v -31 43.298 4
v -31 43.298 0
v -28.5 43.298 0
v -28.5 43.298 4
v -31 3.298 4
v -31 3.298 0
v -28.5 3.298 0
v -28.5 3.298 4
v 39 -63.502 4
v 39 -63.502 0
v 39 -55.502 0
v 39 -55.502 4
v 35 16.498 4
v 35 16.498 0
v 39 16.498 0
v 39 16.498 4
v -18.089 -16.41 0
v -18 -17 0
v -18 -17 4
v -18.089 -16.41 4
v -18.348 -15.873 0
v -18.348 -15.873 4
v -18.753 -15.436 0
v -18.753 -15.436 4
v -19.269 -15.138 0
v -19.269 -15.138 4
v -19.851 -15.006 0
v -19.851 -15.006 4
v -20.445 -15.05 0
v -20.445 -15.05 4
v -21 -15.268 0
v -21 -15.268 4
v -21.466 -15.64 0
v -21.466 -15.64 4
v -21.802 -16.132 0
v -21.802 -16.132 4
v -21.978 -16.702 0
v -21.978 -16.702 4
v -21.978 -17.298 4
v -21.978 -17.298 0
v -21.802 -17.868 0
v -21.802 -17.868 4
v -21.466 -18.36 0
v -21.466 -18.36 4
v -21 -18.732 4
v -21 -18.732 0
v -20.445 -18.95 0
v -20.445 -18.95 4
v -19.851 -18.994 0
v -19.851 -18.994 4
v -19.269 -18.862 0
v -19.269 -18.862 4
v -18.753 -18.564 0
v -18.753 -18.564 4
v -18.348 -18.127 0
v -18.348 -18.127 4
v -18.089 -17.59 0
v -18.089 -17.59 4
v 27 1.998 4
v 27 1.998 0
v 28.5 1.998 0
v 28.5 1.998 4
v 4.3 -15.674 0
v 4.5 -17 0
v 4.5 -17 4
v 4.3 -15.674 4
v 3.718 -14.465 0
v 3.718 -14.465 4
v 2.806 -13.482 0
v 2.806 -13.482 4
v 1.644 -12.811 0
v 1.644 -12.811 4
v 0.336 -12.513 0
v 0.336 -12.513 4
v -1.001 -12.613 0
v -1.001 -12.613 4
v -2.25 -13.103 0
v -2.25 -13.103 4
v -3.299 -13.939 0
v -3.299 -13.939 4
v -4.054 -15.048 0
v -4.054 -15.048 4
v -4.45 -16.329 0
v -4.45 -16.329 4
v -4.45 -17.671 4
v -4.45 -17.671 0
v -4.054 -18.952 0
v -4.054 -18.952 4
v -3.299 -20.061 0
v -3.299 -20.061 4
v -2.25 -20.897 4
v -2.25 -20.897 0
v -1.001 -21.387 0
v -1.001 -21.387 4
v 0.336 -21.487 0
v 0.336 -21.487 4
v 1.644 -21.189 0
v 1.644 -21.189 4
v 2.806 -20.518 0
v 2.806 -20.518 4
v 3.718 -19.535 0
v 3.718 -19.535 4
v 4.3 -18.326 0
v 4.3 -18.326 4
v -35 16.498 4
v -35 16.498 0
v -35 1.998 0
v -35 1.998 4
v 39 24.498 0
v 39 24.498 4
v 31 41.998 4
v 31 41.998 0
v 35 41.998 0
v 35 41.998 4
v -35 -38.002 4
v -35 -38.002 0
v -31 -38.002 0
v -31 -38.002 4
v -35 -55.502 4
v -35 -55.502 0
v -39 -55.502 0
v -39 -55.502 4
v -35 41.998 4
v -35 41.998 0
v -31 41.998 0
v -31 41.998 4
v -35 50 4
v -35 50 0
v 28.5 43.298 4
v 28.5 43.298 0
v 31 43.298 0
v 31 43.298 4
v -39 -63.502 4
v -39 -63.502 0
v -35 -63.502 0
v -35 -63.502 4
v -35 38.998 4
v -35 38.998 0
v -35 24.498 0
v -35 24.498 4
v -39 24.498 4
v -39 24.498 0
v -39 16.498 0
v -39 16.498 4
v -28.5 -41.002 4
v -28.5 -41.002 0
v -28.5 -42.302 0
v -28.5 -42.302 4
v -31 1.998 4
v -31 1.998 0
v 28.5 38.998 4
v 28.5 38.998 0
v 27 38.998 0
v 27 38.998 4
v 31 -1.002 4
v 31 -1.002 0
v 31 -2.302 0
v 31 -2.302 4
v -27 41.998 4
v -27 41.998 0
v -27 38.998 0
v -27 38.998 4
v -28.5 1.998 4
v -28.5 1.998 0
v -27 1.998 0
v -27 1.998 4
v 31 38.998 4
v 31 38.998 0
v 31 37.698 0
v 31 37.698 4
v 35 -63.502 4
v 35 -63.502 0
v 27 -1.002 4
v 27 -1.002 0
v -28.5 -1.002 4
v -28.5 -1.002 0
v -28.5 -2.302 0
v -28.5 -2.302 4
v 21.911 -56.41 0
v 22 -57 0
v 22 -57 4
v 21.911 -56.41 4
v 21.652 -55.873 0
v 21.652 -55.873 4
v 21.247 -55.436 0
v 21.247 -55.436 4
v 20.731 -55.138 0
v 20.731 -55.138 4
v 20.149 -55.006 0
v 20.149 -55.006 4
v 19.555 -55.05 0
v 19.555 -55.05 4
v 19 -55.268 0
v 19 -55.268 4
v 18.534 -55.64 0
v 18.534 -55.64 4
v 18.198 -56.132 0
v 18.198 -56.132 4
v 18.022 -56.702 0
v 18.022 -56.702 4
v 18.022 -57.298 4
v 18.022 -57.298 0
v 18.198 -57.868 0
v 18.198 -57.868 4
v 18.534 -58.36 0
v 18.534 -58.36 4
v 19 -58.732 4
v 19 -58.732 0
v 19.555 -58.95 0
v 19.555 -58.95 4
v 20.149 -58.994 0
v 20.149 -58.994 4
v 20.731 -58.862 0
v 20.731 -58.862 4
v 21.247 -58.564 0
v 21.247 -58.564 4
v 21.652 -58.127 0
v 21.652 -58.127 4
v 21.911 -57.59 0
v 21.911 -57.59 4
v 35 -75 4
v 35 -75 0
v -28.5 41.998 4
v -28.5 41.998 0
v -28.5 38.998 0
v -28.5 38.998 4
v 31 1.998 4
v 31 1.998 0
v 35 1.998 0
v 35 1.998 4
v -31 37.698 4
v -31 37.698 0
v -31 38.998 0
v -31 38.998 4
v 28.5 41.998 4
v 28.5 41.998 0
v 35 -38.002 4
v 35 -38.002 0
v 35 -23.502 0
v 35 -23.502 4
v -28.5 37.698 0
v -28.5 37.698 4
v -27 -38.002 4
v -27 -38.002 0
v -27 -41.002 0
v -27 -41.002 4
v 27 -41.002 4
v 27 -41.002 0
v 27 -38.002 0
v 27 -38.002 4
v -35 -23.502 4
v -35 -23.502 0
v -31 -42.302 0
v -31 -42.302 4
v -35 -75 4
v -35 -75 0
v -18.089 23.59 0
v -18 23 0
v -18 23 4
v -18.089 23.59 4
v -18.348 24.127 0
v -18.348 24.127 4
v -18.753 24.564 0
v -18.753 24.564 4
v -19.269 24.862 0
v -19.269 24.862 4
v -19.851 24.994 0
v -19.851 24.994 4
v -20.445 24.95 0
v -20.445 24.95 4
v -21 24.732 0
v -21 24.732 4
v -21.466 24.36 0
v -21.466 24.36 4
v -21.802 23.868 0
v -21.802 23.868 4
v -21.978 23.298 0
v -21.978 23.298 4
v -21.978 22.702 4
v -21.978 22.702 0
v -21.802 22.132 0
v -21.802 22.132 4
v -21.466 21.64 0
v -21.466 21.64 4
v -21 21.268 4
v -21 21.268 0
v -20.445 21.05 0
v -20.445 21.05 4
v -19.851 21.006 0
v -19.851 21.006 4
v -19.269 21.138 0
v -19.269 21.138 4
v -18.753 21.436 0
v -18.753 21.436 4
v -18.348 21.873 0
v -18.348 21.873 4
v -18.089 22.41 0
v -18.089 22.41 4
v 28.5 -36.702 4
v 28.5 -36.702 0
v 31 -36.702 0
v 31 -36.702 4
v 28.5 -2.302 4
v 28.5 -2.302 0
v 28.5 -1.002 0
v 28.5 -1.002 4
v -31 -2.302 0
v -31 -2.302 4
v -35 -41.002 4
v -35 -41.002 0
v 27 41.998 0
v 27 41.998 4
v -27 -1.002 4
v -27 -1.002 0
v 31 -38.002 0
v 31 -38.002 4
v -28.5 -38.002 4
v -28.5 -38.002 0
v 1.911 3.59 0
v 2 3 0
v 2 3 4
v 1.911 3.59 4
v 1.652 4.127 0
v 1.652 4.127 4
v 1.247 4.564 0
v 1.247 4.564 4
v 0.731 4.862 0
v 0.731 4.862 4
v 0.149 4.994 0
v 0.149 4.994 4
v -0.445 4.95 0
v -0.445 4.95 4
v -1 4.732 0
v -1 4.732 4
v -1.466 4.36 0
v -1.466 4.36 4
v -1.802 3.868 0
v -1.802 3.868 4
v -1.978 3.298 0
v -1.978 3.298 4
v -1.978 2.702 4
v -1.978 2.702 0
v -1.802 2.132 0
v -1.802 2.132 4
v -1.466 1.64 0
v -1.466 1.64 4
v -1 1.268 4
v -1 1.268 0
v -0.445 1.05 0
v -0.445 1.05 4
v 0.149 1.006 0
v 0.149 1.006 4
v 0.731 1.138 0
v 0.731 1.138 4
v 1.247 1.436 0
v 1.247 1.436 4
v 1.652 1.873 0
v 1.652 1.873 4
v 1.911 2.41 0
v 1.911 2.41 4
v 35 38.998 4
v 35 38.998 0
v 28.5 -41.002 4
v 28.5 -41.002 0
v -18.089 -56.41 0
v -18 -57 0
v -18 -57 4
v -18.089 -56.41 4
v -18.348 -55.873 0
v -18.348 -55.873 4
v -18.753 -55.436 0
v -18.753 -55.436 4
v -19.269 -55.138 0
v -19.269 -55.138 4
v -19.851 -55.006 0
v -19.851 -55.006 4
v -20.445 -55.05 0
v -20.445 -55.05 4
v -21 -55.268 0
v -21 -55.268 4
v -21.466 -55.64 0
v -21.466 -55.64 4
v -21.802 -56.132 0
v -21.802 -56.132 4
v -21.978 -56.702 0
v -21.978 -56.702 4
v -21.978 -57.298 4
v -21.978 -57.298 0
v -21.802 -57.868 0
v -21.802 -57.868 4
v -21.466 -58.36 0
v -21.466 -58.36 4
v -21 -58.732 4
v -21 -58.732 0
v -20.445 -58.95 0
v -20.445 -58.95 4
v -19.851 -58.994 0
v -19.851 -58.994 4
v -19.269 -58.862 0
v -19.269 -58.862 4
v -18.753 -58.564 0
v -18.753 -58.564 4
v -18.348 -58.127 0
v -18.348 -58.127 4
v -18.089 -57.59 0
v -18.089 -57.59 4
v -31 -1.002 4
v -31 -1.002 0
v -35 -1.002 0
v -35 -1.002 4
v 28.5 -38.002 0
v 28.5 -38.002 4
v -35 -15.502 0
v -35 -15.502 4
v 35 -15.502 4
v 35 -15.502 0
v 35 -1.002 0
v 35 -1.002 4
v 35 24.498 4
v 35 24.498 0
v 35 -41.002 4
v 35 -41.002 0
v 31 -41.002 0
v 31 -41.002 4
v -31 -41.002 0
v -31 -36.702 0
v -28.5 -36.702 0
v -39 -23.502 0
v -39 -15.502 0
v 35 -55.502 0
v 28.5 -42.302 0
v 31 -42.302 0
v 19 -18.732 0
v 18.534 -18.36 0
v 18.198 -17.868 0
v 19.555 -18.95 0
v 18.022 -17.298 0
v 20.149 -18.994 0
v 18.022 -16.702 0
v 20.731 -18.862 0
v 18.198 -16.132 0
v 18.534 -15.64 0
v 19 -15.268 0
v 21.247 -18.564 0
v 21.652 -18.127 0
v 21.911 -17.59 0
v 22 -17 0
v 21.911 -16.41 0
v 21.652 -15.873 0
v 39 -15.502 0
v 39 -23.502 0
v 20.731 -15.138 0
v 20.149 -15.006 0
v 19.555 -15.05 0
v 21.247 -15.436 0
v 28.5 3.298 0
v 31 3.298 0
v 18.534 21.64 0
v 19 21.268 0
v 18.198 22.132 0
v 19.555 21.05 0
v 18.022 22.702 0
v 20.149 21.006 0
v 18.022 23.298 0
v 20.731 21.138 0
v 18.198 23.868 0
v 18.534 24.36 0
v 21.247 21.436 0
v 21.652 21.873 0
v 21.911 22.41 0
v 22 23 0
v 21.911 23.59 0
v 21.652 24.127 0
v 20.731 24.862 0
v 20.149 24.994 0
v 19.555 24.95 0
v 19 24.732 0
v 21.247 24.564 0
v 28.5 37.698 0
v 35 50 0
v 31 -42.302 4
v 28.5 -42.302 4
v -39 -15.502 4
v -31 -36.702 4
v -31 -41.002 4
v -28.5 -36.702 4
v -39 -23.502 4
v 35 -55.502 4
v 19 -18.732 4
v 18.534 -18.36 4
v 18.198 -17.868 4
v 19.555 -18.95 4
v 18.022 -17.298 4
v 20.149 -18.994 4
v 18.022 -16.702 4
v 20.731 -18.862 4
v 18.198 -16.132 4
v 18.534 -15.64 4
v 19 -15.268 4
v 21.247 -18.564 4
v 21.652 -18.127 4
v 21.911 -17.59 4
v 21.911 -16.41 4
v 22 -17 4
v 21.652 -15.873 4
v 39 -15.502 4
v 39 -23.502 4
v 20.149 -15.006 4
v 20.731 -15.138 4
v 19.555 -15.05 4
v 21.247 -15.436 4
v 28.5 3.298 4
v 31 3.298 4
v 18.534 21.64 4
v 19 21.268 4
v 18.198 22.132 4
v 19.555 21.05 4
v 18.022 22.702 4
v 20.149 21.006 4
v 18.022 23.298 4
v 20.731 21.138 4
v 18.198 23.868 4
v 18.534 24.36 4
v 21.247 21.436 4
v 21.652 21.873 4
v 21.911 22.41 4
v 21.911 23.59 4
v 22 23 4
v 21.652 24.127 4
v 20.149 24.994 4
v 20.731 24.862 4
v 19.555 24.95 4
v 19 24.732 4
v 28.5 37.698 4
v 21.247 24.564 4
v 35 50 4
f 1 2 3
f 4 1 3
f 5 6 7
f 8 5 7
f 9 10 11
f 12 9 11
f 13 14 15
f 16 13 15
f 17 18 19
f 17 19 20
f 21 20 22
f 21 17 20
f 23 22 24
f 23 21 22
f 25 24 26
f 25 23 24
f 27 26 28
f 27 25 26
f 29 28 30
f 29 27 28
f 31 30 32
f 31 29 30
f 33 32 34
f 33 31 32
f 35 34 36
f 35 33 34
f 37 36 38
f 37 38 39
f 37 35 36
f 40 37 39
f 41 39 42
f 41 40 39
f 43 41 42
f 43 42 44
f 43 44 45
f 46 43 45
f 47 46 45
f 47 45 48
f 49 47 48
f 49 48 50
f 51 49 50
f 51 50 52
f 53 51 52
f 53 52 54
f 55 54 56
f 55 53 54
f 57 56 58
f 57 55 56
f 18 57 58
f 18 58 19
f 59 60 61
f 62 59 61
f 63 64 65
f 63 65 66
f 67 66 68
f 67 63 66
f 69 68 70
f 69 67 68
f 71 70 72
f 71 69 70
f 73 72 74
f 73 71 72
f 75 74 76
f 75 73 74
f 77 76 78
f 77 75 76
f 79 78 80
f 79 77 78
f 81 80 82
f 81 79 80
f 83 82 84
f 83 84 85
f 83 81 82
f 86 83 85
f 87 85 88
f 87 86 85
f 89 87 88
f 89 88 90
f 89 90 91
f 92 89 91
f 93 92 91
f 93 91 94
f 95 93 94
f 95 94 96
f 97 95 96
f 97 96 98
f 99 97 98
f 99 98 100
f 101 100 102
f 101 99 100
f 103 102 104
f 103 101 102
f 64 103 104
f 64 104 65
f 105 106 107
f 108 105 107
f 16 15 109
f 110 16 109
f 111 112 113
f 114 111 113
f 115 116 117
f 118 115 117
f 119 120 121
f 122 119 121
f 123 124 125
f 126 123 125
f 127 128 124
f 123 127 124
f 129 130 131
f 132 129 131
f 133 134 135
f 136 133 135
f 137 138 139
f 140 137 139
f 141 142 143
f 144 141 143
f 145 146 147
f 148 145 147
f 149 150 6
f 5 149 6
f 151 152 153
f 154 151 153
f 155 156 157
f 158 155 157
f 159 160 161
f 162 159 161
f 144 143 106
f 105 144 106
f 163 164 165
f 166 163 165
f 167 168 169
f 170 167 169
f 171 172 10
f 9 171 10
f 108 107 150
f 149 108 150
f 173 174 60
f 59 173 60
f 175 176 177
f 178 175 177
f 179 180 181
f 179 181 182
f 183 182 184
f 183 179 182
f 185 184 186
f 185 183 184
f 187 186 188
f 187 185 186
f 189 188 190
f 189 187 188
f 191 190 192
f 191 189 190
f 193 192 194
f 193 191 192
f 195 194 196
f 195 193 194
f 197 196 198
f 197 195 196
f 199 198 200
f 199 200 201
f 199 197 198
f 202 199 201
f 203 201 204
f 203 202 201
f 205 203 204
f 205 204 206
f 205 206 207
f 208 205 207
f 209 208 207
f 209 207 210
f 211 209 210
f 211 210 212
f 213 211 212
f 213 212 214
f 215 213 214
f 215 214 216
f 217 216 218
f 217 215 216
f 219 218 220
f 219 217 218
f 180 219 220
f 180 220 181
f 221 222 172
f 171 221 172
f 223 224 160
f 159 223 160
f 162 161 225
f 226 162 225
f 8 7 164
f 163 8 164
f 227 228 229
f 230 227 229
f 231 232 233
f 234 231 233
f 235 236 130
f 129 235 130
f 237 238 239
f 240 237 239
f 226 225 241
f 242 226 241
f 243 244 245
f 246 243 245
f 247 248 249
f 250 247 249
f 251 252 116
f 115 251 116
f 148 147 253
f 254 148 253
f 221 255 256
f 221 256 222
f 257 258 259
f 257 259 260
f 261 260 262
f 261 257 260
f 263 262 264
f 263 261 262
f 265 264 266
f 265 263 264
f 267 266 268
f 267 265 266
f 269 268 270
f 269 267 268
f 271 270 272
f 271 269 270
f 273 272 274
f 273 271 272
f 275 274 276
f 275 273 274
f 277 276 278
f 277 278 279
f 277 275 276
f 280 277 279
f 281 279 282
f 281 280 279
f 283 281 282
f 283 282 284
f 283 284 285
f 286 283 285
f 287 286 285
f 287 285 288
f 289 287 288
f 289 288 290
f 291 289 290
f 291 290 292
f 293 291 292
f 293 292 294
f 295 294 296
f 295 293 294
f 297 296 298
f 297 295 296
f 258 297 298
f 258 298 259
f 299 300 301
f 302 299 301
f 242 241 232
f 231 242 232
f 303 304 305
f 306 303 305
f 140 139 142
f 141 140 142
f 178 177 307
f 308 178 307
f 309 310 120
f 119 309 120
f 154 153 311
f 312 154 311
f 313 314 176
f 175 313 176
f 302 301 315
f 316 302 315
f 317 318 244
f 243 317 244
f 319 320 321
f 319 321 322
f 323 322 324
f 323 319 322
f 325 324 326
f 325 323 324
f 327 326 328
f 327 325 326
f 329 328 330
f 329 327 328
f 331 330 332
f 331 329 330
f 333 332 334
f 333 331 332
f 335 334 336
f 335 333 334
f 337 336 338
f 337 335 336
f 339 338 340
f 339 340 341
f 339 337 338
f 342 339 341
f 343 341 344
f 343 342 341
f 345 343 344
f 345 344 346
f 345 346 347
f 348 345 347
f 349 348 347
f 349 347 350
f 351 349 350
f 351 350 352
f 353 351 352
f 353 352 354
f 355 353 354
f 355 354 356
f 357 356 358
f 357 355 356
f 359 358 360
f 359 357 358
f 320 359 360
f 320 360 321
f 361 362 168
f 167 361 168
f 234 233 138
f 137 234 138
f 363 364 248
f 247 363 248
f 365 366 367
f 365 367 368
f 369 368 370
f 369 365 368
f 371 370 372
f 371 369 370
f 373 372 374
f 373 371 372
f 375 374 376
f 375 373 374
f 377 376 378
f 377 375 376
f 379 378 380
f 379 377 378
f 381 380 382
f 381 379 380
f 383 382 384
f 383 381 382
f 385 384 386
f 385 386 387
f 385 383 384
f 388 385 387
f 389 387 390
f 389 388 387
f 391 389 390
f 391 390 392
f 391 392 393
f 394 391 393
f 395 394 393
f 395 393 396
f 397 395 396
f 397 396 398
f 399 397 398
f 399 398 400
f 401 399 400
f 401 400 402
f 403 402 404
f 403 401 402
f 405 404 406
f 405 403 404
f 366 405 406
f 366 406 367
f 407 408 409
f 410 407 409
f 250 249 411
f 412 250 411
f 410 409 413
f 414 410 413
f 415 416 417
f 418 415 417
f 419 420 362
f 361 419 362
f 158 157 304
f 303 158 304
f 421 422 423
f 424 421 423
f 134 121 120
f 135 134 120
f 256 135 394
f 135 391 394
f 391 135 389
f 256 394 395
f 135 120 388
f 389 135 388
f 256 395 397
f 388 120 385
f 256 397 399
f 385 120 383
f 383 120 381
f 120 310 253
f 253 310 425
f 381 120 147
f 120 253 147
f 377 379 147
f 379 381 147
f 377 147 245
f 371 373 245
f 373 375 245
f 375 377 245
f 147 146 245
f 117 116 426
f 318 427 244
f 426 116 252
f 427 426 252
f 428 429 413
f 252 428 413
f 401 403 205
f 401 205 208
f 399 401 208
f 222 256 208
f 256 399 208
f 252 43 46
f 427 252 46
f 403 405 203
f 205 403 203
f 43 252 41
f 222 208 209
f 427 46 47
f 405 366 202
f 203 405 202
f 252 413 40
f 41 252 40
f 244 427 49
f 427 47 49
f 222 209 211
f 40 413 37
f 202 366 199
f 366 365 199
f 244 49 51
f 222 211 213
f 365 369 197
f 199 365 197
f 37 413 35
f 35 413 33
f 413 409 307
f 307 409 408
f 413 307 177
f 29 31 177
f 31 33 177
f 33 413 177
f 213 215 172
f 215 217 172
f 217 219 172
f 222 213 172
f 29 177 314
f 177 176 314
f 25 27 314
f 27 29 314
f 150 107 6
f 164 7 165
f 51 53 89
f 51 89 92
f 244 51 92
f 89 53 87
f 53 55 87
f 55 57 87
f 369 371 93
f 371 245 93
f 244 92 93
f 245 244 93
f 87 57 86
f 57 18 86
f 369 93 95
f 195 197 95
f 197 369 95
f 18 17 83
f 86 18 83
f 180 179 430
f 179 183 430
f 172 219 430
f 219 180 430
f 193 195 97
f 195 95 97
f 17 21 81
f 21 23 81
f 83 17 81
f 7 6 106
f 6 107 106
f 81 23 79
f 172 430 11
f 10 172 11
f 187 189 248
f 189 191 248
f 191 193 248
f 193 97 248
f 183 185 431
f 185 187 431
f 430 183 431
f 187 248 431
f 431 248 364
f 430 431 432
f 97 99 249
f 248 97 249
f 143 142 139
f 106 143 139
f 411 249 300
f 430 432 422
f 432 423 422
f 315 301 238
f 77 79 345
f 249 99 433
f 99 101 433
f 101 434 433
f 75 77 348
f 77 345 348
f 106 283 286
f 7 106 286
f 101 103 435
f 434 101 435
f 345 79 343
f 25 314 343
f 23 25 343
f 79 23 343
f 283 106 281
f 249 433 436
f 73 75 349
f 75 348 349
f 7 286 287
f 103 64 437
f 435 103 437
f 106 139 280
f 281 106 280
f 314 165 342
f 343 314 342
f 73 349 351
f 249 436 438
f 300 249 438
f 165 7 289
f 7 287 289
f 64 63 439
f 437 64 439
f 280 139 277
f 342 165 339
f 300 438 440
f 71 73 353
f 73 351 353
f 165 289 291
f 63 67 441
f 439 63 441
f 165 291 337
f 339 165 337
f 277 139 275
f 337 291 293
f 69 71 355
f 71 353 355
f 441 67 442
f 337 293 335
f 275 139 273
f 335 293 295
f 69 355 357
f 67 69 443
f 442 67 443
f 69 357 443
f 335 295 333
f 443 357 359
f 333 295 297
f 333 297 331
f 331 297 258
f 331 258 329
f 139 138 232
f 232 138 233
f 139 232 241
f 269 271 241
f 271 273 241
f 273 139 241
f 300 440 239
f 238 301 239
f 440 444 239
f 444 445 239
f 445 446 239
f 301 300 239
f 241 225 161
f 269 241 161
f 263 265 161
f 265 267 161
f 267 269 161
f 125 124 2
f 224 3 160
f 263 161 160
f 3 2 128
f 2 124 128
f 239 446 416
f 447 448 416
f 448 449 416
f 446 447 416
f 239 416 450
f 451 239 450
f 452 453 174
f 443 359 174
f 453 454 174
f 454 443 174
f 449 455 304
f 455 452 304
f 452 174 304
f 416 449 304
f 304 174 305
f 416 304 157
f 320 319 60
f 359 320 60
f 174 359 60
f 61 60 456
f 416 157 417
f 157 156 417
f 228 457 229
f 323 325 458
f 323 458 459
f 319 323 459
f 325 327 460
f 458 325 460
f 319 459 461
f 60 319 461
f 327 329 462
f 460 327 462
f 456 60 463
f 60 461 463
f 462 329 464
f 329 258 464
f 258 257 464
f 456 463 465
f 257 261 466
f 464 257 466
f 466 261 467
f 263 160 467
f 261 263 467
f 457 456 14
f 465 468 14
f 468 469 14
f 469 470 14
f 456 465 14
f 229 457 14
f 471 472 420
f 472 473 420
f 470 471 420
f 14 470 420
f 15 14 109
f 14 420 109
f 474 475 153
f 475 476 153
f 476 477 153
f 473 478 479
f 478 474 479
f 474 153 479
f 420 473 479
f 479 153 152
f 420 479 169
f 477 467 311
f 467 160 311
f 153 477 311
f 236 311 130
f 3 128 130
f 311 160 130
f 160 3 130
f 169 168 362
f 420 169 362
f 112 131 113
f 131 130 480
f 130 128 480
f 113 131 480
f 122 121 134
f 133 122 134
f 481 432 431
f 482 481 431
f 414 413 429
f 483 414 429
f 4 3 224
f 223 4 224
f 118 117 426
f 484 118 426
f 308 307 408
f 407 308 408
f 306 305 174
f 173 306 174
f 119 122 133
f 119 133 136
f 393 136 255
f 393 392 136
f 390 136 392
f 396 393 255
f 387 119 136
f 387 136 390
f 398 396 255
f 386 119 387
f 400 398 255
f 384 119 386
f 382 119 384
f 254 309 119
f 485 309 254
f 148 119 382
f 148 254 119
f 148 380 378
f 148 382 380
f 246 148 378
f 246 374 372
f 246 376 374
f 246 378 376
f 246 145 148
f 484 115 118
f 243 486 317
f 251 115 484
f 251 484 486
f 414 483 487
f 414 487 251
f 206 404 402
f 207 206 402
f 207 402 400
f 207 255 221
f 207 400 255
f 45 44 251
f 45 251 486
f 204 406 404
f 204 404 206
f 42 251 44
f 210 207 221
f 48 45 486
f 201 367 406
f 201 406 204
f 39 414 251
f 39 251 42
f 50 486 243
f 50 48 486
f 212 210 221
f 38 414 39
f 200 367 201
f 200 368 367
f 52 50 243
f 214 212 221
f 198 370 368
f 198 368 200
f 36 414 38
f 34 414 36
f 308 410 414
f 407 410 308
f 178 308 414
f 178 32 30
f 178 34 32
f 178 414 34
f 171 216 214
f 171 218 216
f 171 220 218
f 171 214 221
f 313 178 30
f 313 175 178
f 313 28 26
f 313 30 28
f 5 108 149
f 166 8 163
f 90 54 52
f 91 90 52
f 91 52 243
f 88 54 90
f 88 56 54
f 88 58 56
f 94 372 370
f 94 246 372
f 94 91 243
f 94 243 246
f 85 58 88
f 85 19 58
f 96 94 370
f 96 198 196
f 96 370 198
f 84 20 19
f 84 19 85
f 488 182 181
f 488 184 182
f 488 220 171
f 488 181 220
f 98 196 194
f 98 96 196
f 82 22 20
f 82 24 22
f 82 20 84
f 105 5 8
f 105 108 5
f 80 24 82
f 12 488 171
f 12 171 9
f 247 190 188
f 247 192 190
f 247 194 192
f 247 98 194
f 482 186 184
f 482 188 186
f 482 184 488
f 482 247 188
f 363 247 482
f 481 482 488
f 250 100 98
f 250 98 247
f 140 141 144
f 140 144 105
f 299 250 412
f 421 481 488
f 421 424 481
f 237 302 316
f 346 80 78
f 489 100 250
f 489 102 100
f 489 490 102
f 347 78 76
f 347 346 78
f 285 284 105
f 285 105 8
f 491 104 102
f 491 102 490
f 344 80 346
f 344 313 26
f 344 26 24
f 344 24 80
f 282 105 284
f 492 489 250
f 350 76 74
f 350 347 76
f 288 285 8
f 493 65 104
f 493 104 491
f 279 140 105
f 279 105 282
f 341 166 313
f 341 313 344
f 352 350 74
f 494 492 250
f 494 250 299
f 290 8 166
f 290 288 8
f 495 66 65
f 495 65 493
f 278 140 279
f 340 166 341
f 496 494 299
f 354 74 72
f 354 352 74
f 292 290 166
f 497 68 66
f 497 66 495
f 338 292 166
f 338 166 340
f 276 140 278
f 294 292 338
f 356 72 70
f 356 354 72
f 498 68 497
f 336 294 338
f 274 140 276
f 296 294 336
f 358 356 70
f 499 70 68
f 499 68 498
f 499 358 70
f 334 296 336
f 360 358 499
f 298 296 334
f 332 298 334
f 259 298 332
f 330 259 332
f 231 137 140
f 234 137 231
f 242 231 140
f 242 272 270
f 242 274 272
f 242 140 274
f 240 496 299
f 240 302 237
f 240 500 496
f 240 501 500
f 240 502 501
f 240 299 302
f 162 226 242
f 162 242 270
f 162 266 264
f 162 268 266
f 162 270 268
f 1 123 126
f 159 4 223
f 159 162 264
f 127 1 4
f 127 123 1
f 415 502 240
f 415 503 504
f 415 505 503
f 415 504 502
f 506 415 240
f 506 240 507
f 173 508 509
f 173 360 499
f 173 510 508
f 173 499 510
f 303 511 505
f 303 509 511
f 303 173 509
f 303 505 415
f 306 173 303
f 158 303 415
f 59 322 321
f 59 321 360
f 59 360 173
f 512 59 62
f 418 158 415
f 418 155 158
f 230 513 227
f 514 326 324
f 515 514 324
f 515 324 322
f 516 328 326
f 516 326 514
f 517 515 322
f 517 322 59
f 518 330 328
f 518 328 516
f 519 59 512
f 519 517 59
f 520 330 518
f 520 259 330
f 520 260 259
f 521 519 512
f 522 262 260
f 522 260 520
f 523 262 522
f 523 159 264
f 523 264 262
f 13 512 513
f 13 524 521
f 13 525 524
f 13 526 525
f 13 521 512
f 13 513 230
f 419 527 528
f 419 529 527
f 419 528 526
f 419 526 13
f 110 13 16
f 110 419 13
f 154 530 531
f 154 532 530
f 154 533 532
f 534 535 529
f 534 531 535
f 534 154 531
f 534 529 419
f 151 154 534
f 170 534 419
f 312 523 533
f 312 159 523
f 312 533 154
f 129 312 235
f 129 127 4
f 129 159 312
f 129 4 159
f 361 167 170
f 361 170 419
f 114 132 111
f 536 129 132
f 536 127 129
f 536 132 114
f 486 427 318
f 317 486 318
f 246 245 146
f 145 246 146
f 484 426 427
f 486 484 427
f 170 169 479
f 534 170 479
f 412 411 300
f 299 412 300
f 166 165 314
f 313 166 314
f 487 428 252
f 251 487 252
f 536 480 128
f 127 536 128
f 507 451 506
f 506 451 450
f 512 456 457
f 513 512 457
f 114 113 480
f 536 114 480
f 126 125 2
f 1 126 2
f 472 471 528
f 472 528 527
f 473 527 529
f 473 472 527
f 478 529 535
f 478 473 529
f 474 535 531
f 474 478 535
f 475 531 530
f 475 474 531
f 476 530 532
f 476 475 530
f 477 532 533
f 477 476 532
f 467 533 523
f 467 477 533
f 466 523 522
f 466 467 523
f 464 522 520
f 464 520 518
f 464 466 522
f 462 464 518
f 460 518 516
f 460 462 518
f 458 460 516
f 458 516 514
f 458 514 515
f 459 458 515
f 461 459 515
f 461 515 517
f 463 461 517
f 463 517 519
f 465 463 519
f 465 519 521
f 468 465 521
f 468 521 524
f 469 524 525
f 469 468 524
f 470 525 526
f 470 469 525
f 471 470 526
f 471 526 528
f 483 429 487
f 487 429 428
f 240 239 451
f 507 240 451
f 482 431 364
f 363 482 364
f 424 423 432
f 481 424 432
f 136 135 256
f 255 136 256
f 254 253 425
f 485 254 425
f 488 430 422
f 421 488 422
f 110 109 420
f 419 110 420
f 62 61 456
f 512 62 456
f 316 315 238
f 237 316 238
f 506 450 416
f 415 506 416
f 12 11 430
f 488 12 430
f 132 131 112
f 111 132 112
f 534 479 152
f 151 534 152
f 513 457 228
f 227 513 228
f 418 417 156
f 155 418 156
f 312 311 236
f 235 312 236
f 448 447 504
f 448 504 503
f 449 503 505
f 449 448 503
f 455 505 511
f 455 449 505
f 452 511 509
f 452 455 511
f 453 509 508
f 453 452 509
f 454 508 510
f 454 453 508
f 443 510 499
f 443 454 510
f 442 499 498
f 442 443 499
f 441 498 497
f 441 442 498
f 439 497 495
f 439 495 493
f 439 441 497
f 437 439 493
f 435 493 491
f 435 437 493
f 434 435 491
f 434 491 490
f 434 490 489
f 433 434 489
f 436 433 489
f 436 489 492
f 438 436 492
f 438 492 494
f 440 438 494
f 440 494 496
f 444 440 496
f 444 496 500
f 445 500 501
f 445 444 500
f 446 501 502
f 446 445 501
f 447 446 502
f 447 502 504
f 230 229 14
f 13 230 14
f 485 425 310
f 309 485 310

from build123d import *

# Parameters (mm, degrees)
SKETCH_1_R          = 2
SKETCH_1_R_2        = 4.5
EXTRUDE_1_DEPTH     = 4
SKETCH_4_W          = 70
SKETCH_4_H          = 12
CUT_EXTRUDE_1_DEPTH = 4


with BuildPart() as part:
    # 草图1 → 凸台-拉伸1 (new body)
    with BuildSketch(Plane.XY):
        Polygon((35, 50), (-35, 50), (-35, 41.99755337), (-31, 41.99755337), (-31, 43.29755337), (-28.5, 43.29755337), (-28.5, 41.99755337), (-27, 41.99755337), (-27, 38.99755337), (-28.5, 38.99755337), (-28.5, 37.69755337), (-31, 37.69755337), (-31, 38.99755337), (-35, 38.99755337), (-35, 24.49755337), (-39, 24.49755337), (-39, 16.49755337), (-35, 16.49755337), (-35, 1.99755337), (-31, 1.99755337), (-31, 3.29755337), (-28.5, 3.29755337), (-28.5, 1.99755337), (-27, 1.99755337), (-27, -1.00244663), (-28.5, -1.00244663), (-28.5, -2.30244663), (-31, -2.30244663), (-31, -1.00244663), (-35, -1.00244663), (-35, -15.50244663), (-39, -15.50244663), (-39, -23.50244663), (-35, -23.50244663), (-35, -38.00244663), (-31, -38.00244663), (-31, -36.70244663), (-28.5, -36.70244663), (-28.5, -38.00244663), (-27, -38.00244663), (-27, -41.00244663), (-28.5, -41.00244663), (-28.5, -42.30244663), (-31, -42.30244663), (-31, -41.00244663), (-35, -41.00244663), (-35, -55.50244663), (-39, -55.50244663), (-39, -63.50244663), (-35, -63.50244663), (-35, -87), (35, -87), (35, -63.50244663), (39, -63.50244663), (39, -55.50244663), (35, -55.50244663), (35, -41.00244663), (31, -41.00244663), (31, -42.30244663), (28.5, -42.30244663), (28.5, -41.00244663), (27, -41.00244663), (27, -38.00244663), (28.5, -38.00244663), (28.5, -36.70244663), (31, -36.70244663), (31, -38.00244663), (35, -38.00244663), (35, -23.50244663), (39, -23.50244663), (39, -15.50244663), (35, -15.50244663), (35, -1.00244663), (31, -1.00244663), (31, -2.30244663), (28.5, -2.30244663), (28.5, -1.00244663), (27, -1.00244663), (27, 1.99755337), (28.5, 1.99755337), (28.5, 3.29755337), (31, 3.29755337), (31, 1.99755337), (35, 1.99755337), (35, 16.49755337), (39, 16.49755337), (39, 24.49755337), (35, 24.49755337), (35, 38.99755337), (31, 38.99755337), (31, 37.69755337), (28.5, 37.69755337), (28.5, 38.99755337), (27, 38.99755337), (27, 41.99755337), (28.5, 41.99755337), (28.5, 43.29755337), (31, 43.29755337), (31, 41.99755337), (35, 41.99755337), align=None)
        with Locations((-20, -57)):
            Circle(SKETCH_1_R, mode=Mode.SUBTRACT)
        with Locations((20, -57)):
            Circle(SKETCH_1_R, mode=Mode.SUBTRACT)
        with Locations((-20, -17)):
            Circle(SKETCH_1_R, mode=Mode.SUBTRACT)
        with Locations((0, 3)):
            Circle(SKETCH_1_R, mode=Mode.SUBTRACT)
        with Locations((-20, 23)):
            Circle(SKETCH_1_R, mode=Mode.SUBTRACT)
        with Locations((0, -17)):
            Circle(SKETCH_1_R_2, mode=Mode.SUBTRACT)
        with Locations((20, -17)):
            Circle(SKETCH_1_R, mode=Mode.SUBTRACT)
        with Locations((20, 23)):
            Circle(SKETCH_1_R, mode=Mode.SUBTRACT)
    extrude(amount=EXTRUDE_1_DEPTH)

    # 草图4 → 切除-拉伸1 (cut)
    with BuildSketch(Plane.XY.offset(4)):
        with Locations((0, -81)):
            Rectangle(SKETCH_4_W, SKETCH_4_H)
    extrude(amount=-CUT_EXTRUDE_1_DEPTH, mode=Mode.SUBTRACT)


solid = part.part
